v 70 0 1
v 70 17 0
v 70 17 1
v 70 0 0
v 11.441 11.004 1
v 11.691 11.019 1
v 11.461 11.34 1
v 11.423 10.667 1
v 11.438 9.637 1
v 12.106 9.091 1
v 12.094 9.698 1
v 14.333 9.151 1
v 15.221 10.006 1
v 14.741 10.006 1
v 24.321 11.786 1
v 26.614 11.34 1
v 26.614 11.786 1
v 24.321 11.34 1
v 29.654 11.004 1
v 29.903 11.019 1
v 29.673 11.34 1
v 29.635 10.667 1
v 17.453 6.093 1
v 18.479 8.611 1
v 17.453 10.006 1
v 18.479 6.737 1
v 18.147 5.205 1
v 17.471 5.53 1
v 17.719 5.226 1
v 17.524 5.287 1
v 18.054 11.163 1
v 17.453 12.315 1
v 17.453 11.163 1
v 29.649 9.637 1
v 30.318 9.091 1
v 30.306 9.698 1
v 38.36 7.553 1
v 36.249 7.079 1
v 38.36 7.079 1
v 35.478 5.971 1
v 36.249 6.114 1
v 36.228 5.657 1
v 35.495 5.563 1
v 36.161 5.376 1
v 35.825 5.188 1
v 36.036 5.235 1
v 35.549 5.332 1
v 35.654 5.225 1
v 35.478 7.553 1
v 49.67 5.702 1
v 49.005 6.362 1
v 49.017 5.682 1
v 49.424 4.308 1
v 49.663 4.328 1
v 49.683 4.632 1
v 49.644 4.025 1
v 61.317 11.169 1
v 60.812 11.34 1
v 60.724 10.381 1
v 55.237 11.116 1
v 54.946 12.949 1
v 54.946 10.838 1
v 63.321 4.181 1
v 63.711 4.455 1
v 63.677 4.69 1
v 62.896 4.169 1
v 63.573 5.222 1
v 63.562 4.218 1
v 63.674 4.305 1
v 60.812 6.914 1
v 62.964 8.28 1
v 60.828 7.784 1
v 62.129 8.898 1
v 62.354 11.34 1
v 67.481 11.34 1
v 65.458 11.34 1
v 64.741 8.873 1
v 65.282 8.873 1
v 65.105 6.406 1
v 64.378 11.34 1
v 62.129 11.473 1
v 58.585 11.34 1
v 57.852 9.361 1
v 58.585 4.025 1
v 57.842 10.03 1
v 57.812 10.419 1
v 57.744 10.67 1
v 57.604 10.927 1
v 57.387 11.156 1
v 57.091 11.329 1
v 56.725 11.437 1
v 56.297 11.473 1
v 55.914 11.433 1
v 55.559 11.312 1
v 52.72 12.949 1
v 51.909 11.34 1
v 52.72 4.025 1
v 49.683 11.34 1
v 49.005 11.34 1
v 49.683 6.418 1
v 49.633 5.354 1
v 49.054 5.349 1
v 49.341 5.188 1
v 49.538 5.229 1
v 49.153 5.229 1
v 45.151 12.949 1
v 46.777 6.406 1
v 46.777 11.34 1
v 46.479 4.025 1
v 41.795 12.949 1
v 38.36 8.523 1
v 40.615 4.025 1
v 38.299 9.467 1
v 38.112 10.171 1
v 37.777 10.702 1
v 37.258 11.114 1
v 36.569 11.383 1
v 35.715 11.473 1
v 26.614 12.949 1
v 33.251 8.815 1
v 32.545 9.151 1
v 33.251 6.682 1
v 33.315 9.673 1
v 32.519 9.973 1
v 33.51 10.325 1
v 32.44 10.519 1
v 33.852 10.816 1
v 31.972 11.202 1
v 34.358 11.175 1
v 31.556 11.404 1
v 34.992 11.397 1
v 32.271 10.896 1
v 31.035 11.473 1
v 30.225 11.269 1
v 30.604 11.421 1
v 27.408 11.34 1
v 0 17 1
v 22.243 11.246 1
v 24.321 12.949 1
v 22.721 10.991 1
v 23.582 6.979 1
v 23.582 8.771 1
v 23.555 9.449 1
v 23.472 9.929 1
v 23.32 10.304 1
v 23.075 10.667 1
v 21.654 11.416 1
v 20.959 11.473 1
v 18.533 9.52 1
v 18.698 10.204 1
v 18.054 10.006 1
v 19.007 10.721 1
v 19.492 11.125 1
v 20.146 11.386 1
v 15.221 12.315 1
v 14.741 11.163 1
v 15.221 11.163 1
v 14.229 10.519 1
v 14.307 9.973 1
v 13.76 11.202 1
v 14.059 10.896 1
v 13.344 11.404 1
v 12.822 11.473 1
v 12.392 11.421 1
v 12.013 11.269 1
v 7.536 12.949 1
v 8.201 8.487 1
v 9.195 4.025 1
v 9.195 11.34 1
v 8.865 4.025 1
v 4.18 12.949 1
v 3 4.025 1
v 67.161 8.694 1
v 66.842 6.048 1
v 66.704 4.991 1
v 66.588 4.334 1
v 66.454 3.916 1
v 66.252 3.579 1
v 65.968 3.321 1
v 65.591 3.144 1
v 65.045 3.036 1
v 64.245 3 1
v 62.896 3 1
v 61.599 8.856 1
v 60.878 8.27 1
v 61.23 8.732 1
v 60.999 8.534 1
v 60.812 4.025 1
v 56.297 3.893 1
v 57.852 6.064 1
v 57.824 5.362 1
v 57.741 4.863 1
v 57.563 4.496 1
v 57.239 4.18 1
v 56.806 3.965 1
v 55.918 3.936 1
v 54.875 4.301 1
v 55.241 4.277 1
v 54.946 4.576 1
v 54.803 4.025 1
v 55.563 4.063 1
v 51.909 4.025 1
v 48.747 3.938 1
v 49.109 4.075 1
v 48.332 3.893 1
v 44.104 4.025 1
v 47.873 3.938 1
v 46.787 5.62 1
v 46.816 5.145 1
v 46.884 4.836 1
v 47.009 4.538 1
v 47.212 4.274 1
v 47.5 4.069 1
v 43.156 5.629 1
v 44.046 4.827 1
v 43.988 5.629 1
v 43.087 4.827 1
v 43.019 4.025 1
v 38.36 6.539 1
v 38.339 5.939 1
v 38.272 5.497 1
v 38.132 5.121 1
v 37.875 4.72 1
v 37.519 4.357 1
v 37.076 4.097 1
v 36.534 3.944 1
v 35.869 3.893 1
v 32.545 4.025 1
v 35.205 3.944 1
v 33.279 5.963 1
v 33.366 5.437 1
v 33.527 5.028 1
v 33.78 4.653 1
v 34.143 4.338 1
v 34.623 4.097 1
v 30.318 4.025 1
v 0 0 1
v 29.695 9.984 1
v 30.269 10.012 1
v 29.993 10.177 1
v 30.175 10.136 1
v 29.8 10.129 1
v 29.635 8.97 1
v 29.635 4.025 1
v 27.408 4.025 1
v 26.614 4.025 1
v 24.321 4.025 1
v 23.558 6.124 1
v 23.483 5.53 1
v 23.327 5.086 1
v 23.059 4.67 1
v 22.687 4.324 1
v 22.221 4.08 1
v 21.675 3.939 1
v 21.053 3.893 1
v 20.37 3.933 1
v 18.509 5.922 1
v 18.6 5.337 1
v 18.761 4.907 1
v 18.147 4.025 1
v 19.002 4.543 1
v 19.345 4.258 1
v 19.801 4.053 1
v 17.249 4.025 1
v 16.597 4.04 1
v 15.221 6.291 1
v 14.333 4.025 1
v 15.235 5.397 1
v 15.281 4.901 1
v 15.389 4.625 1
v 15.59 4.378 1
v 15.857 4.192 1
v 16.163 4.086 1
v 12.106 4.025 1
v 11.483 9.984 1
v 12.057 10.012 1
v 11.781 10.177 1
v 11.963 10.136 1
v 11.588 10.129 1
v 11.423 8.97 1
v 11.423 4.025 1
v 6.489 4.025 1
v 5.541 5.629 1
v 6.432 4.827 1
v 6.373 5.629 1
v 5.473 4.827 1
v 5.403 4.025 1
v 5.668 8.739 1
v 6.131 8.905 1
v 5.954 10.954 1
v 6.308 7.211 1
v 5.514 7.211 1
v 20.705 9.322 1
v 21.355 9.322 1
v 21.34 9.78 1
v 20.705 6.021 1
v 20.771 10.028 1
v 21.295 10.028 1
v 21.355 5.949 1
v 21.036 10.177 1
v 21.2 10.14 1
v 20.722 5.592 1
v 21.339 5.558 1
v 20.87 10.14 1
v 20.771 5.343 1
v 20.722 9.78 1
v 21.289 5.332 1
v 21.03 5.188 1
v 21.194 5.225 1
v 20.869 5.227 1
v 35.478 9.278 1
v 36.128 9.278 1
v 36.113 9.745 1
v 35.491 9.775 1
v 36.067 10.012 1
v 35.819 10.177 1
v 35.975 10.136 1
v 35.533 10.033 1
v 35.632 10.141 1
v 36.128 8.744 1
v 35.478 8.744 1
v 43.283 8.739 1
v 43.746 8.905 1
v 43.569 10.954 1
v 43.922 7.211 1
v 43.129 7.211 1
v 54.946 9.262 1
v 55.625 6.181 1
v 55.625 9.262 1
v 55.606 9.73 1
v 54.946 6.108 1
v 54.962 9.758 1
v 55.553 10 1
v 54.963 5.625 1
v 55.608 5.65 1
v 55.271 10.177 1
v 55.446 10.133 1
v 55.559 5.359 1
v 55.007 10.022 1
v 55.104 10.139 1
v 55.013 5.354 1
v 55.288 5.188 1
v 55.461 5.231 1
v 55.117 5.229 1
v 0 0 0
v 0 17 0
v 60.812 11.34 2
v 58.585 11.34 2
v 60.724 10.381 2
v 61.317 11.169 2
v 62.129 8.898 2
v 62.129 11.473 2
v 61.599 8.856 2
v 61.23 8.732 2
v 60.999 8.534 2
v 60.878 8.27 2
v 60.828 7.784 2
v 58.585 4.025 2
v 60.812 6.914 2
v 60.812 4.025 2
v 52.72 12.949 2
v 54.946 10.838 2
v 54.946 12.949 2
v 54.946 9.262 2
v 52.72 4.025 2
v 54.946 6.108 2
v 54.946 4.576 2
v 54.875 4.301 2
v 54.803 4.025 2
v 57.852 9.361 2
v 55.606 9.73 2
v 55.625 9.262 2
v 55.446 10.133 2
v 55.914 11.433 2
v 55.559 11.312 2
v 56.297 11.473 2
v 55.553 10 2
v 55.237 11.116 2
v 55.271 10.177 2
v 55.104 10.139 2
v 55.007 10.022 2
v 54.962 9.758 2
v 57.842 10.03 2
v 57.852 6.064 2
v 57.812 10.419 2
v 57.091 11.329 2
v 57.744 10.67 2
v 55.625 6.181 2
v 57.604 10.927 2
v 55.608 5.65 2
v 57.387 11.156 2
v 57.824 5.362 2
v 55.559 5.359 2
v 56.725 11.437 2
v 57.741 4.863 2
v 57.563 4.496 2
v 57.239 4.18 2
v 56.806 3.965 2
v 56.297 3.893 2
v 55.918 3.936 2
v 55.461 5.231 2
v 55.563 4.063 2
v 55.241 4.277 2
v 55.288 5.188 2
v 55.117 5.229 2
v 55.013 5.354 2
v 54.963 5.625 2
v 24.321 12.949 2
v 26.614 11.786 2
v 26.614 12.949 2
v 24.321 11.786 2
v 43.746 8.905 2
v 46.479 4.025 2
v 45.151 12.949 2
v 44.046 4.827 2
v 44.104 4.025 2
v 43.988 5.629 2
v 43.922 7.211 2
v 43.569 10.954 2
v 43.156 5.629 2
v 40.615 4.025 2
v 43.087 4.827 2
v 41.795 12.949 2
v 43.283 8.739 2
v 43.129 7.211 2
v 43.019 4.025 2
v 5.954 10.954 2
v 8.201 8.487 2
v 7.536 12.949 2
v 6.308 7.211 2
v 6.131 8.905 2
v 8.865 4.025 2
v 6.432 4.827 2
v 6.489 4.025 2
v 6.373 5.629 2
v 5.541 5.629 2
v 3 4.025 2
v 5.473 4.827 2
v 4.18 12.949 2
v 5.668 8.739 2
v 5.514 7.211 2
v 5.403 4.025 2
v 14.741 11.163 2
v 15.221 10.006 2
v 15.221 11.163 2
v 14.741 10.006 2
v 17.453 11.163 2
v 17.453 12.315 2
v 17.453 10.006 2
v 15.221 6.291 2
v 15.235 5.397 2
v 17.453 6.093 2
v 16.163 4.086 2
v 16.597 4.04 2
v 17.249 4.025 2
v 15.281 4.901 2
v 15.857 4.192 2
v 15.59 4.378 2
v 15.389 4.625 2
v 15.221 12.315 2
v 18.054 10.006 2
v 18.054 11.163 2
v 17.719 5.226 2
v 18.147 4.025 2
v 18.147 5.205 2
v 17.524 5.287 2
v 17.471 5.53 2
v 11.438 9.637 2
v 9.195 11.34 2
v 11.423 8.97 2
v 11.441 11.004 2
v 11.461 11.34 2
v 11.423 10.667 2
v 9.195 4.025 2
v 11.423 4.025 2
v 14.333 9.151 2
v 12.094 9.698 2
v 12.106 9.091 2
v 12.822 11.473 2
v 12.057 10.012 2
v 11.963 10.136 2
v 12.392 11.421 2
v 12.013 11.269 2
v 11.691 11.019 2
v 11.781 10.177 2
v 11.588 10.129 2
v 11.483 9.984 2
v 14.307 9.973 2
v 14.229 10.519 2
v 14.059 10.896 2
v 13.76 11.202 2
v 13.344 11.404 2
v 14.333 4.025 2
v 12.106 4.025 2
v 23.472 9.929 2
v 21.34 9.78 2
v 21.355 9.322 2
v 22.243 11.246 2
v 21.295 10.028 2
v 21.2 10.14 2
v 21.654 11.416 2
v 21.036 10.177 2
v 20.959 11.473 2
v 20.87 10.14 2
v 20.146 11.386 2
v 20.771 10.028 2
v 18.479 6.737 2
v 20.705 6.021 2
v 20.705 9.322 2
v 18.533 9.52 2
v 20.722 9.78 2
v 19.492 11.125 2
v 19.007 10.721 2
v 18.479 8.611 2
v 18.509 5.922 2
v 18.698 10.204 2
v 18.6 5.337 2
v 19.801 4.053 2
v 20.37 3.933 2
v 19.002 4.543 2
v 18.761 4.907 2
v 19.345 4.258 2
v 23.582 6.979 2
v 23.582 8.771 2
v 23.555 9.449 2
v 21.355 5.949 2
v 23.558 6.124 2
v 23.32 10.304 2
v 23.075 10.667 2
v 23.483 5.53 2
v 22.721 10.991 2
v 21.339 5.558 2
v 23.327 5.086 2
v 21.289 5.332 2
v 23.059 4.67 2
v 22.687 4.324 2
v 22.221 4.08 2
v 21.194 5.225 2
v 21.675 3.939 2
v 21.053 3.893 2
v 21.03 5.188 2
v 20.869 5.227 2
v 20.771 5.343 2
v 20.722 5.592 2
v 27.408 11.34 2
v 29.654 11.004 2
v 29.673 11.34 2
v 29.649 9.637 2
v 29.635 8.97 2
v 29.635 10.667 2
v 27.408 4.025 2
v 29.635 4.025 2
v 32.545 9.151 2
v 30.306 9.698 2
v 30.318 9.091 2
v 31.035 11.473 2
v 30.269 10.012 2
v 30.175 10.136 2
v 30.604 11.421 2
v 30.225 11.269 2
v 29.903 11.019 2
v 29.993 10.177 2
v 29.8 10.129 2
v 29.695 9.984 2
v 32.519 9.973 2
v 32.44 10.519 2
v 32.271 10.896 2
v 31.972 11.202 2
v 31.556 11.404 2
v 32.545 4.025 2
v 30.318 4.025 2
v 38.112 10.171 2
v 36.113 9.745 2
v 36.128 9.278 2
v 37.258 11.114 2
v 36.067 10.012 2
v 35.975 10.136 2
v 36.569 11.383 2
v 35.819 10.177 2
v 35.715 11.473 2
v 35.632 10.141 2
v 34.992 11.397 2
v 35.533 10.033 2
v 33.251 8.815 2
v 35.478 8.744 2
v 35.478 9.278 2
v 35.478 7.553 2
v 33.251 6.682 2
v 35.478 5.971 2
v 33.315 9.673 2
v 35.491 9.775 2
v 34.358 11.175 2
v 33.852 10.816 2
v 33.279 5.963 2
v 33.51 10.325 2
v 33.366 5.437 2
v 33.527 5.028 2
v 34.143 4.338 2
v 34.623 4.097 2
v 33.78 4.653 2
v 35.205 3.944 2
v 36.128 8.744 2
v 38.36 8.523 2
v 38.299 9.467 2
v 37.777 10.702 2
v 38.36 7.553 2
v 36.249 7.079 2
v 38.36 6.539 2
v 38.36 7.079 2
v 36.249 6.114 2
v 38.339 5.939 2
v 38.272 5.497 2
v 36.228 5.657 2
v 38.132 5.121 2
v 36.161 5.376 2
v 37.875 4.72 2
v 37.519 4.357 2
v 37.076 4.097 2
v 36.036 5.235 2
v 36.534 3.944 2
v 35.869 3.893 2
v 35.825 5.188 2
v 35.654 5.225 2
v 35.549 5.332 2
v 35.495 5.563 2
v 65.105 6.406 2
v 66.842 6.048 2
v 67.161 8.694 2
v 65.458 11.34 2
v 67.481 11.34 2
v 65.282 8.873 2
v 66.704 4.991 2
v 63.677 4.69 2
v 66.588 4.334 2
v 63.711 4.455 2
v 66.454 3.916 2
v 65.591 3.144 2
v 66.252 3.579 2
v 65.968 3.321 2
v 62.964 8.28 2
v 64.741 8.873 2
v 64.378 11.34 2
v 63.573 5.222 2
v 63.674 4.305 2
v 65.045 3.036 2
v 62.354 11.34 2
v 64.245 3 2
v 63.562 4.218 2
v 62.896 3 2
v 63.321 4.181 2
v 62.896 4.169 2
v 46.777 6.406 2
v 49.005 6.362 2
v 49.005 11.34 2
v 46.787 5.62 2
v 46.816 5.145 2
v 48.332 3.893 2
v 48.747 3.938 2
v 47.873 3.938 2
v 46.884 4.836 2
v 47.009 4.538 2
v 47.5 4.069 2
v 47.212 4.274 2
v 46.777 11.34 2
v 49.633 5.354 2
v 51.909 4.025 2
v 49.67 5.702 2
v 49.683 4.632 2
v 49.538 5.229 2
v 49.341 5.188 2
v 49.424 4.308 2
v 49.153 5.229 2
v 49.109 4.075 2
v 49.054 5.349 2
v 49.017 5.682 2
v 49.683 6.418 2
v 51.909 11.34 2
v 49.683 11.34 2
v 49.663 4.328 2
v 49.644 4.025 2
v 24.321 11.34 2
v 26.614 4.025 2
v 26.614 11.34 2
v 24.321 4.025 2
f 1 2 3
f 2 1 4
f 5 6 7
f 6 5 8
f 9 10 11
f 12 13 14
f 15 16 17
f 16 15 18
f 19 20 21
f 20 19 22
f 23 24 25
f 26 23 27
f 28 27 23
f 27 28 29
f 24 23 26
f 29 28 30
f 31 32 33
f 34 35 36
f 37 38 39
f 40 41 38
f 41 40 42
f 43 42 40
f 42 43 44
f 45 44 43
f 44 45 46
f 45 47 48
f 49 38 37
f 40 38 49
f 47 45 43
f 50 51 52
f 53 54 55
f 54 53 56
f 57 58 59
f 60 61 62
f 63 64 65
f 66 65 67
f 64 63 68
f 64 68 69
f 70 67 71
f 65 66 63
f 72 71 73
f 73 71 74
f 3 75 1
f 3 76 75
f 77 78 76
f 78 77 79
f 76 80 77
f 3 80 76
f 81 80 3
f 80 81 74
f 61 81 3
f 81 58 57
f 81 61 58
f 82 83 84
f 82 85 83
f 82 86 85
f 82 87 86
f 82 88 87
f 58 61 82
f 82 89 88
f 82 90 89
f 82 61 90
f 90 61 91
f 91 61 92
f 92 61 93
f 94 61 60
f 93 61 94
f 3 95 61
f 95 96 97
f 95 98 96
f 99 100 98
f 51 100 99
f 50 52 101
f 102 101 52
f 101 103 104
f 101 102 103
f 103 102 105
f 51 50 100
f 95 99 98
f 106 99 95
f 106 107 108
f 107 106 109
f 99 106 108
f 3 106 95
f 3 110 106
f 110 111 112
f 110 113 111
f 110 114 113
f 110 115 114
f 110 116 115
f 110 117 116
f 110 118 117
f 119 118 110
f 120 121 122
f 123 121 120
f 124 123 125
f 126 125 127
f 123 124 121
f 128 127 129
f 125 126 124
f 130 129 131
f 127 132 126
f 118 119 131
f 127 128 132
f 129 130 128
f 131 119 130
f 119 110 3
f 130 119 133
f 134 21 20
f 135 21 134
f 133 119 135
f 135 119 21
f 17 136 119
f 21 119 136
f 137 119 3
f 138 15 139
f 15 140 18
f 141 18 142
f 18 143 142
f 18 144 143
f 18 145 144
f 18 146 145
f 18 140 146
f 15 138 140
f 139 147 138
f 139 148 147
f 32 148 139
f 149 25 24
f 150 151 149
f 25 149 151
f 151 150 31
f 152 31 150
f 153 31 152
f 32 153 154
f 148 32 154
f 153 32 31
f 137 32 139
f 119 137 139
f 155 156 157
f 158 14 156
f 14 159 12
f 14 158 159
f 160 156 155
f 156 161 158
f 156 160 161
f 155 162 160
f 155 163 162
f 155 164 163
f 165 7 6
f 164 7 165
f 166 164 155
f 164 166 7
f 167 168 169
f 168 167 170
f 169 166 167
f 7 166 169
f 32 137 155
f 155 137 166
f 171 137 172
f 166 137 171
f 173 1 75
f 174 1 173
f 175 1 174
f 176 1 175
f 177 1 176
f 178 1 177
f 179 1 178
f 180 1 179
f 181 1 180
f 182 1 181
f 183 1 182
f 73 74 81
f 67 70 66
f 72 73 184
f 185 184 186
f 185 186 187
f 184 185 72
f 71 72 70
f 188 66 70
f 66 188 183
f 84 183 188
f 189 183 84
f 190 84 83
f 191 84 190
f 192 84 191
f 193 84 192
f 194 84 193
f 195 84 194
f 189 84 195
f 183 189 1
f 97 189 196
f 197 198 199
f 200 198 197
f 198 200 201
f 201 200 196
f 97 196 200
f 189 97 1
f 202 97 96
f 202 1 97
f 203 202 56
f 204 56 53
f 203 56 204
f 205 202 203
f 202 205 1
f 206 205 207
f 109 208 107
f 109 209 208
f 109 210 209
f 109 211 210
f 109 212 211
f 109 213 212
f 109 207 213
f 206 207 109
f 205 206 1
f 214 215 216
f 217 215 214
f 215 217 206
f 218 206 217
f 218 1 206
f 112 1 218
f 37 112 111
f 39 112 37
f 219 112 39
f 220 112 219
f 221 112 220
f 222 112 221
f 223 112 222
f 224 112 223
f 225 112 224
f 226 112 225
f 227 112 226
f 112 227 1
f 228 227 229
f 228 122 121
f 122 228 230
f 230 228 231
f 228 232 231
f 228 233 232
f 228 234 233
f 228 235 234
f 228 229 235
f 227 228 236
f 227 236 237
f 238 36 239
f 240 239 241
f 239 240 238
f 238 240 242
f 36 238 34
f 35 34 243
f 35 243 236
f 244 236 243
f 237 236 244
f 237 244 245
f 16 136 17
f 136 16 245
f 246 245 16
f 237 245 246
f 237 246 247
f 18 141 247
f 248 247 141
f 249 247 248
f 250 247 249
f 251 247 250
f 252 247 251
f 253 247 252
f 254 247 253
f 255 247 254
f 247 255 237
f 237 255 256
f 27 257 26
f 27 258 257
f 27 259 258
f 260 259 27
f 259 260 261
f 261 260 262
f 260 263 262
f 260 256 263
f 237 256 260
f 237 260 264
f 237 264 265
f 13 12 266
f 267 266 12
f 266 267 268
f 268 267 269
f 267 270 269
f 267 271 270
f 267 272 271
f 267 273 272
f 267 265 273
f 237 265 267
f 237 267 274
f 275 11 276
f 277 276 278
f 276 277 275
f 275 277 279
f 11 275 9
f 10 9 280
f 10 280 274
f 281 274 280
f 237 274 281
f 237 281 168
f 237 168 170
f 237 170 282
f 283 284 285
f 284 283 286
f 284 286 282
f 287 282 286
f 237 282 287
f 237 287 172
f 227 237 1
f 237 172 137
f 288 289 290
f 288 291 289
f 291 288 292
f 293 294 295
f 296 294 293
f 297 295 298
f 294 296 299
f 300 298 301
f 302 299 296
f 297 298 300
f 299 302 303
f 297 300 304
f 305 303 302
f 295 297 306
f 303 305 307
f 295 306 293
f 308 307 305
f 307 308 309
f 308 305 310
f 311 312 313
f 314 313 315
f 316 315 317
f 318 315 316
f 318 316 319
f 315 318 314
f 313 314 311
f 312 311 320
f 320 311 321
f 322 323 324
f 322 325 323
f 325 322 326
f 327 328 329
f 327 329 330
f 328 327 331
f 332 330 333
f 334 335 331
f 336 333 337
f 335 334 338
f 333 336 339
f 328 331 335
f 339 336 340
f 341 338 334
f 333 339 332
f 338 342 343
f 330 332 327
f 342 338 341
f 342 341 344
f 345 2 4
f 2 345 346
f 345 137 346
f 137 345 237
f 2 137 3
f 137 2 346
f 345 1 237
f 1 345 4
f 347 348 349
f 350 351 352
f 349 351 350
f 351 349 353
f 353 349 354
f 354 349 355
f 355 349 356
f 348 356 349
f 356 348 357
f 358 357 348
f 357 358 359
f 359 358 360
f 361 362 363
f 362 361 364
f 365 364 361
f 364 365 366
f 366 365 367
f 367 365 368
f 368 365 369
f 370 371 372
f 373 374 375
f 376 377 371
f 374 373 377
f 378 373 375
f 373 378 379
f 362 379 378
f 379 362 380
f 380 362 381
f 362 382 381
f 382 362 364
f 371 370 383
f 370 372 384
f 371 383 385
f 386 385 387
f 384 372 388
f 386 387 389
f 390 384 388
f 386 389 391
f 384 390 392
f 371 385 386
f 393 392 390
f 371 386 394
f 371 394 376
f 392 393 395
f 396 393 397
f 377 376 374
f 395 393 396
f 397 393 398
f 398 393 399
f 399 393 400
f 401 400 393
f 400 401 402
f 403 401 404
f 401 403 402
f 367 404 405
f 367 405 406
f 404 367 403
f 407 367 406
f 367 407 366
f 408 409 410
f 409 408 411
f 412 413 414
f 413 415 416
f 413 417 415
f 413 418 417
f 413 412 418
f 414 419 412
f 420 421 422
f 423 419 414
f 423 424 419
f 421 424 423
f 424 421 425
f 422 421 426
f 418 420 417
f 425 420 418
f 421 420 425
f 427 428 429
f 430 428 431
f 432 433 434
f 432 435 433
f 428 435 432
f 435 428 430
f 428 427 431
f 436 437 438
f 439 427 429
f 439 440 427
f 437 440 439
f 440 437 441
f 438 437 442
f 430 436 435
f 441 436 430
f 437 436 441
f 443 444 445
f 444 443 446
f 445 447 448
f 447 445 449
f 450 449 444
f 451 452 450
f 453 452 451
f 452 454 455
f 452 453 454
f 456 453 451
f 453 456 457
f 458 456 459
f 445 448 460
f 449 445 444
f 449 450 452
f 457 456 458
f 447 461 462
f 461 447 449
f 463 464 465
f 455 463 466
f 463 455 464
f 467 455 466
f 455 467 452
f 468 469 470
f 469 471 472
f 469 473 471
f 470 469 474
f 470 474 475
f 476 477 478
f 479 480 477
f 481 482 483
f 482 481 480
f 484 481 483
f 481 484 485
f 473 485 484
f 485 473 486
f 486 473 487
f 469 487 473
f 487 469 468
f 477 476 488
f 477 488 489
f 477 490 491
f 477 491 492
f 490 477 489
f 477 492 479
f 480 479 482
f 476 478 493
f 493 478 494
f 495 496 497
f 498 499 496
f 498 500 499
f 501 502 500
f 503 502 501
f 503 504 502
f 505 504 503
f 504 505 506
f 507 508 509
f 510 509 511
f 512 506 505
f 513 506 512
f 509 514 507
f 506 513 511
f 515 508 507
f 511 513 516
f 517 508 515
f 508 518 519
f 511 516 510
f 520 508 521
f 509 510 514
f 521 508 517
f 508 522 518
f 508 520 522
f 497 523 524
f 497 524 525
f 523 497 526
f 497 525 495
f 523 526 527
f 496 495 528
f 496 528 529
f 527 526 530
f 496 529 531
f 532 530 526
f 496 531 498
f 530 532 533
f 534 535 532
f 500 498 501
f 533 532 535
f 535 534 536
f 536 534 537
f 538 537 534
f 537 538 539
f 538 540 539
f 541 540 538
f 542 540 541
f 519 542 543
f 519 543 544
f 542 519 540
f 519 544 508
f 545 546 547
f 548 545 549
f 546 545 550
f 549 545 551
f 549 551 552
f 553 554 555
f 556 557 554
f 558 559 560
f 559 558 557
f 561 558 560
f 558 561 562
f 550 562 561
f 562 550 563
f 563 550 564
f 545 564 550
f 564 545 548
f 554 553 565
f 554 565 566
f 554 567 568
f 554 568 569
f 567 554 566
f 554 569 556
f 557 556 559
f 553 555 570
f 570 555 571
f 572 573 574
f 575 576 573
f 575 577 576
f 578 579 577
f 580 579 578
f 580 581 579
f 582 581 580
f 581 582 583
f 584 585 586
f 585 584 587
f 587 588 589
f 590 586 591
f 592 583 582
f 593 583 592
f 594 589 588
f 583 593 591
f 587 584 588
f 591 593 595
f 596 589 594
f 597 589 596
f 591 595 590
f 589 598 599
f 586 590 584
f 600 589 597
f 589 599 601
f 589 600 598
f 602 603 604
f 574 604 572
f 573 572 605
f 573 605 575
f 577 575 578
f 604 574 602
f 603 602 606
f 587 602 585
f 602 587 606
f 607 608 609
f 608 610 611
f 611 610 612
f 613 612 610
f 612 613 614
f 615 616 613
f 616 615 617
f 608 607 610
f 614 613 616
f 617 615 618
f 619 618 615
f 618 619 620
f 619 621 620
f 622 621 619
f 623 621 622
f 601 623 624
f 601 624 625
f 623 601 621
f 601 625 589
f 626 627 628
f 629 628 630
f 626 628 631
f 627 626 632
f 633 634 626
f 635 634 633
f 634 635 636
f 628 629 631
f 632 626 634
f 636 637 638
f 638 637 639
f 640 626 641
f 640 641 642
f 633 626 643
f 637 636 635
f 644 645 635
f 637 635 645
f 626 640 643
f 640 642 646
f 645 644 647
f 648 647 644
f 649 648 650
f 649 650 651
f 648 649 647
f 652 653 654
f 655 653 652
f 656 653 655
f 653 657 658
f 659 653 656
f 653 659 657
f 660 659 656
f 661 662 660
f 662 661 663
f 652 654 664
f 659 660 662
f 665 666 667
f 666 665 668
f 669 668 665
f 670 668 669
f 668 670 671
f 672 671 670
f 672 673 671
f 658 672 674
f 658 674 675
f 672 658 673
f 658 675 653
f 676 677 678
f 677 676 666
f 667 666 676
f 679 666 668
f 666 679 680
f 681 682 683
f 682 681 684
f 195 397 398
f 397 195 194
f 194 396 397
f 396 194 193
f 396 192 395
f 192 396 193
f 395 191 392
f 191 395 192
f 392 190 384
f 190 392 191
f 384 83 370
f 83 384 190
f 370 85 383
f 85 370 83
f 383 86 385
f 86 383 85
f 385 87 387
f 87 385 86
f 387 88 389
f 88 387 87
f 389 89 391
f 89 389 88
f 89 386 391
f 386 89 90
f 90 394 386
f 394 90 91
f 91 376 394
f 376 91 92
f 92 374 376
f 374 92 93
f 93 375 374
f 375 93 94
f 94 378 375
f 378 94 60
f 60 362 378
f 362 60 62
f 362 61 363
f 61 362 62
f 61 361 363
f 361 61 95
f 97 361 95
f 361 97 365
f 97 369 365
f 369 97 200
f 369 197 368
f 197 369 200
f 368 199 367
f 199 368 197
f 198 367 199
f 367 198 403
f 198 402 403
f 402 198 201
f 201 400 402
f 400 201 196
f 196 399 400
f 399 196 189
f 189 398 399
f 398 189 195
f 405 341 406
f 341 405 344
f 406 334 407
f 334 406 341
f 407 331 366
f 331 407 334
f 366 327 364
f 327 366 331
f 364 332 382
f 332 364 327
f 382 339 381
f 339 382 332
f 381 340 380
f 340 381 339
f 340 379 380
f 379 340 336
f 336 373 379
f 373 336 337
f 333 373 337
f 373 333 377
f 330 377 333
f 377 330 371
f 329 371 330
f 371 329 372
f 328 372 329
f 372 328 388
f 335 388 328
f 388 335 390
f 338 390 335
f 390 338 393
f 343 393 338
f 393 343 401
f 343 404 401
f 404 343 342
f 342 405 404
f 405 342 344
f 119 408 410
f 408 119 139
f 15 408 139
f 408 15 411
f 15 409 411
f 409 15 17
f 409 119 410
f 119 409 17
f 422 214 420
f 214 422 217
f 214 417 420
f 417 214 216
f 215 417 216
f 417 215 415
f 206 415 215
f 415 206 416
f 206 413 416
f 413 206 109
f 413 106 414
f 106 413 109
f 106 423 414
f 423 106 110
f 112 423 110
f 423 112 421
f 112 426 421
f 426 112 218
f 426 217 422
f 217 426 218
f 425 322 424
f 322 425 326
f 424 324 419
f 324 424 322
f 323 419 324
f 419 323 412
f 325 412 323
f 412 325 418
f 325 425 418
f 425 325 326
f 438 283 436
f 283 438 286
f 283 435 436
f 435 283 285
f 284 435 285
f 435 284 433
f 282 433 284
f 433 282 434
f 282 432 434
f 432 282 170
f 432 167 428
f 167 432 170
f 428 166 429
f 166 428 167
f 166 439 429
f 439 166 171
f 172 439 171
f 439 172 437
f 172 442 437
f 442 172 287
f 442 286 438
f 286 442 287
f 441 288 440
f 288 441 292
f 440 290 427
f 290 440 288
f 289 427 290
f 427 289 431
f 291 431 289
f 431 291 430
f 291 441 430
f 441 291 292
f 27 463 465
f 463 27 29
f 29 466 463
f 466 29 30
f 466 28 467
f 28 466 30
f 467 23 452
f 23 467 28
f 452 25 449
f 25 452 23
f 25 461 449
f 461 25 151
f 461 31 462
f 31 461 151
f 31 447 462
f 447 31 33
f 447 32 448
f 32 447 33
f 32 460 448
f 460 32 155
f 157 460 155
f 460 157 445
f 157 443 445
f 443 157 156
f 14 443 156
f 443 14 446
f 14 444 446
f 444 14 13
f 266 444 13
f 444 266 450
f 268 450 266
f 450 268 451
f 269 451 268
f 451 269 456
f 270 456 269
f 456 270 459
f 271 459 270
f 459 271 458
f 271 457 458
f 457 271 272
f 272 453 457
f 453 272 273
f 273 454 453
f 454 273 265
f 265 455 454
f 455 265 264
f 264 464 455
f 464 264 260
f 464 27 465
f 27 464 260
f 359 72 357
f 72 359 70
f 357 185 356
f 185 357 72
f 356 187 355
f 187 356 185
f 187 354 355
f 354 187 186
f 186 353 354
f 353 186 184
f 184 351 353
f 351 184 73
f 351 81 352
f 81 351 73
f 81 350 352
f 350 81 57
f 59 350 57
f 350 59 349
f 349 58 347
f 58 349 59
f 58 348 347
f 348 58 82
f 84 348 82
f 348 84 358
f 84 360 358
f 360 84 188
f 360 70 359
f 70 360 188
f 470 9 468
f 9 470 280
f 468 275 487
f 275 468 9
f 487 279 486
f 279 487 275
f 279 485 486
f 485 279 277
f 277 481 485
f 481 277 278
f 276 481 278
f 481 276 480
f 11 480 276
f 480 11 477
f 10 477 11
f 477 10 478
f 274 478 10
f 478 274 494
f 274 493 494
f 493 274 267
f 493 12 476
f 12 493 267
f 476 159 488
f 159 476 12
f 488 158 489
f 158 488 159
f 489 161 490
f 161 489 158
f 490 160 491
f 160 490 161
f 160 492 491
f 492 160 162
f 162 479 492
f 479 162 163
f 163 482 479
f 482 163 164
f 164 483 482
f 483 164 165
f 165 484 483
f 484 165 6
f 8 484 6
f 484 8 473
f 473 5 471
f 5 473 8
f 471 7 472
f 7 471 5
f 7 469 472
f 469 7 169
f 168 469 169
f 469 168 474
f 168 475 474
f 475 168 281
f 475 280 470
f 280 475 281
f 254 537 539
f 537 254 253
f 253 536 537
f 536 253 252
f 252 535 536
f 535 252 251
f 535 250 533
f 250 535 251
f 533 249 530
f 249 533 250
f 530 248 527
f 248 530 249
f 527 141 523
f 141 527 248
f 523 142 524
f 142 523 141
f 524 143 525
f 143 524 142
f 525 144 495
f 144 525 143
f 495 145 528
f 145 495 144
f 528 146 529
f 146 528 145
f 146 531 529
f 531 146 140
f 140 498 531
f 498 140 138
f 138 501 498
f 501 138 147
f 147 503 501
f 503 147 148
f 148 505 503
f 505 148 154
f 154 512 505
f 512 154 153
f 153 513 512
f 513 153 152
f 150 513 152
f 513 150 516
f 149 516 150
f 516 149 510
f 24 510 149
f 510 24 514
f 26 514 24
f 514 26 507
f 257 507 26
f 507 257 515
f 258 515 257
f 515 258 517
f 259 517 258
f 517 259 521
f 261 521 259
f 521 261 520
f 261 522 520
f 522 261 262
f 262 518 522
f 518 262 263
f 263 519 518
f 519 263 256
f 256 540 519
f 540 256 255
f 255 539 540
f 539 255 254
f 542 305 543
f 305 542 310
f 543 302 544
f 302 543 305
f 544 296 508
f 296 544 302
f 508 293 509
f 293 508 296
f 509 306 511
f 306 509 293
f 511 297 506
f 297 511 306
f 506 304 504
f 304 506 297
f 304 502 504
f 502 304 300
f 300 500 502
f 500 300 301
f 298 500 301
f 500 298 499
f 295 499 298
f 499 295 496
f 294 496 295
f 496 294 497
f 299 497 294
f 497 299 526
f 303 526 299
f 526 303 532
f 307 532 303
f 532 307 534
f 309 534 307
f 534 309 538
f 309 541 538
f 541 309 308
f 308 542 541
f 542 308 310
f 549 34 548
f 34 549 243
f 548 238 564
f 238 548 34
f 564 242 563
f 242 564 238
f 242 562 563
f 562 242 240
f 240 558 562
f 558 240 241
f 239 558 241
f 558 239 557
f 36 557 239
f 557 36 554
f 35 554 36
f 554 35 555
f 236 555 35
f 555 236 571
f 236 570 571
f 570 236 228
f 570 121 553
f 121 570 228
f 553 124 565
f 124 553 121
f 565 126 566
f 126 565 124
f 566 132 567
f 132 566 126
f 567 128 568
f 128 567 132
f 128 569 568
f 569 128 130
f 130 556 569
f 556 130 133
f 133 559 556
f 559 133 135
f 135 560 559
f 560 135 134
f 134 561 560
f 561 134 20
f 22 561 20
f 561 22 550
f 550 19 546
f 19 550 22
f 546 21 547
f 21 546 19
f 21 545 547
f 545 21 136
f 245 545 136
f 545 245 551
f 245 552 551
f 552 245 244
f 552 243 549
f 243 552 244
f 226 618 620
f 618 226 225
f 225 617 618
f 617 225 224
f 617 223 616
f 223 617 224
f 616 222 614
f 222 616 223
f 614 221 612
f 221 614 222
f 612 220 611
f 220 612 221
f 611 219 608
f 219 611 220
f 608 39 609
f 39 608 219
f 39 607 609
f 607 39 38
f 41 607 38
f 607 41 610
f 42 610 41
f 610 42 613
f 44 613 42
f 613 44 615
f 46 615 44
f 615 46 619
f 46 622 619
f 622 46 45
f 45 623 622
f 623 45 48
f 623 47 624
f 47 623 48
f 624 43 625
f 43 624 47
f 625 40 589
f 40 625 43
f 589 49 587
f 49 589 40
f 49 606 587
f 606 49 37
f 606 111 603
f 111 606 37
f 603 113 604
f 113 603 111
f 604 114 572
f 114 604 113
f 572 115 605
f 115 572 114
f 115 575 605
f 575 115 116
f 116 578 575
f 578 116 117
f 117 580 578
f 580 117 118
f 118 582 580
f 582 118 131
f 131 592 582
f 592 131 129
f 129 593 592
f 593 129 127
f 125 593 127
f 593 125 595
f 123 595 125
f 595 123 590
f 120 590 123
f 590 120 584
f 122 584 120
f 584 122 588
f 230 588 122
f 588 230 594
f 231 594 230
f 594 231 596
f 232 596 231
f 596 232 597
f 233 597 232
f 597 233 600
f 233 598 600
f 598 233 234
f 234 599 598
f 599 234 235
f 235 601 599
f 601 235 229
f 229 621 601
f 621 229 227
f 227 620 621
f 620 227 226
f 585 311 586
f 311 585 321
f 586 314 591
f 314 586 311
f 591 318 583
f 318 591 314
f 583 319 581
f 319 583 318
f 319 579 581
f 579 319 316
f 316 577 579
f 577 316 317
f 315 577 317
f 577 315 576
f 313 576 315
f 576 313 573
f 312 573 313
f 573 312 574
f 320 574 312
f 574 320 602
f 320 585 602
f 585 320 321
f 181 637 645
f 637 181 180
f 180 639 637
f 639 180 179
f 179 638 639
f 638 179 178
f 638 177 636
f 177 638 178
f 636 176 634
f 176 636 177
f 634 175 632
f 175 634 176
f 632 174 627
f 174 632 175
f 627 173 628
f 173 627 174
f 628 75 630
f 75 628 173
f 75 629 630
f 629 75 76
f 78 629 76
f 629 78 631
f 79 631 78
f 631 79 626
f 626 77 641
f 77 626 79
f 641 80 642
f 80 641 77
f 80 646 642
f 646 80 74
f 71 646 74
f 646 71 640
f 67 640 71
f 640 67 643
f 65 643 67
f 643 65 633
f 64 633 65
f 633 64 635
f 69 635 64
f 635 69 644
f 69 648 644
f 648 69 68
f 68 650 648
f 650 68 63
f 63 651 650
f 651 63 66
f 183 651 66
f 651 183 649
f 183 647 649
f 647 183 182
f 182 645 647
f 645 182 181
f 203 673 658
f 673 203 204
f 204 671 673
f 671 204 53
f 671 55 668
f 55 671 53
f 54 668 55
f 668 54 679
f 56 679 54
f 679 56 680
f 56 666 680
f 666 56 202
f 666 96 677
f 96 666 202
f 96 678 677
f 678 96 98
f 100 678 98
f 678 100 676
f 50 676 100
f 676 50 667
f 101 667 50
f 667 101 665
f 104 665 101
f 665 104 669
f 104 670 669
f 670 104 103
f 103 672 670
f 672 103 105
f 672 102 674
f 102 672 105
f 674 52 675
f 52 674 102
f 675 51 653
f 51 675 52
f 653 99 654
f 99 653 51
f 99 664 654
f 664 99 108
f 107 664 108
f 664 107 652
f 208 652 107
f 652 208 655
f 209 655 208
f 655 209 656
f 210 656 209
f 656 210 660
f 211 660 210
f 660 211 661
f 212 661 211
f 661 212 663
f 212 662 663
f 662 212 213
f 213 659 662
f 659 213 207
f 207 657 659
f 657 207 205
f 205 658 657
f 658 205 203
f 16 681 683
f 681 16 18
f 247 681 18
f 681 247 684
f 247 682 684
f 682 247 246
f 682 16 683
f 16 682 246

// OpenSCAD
cube([70, 17, 1]);

translate([3, 3, 0.5])
linear_extrude(height = 1.5)
import("antoine.dxf");
